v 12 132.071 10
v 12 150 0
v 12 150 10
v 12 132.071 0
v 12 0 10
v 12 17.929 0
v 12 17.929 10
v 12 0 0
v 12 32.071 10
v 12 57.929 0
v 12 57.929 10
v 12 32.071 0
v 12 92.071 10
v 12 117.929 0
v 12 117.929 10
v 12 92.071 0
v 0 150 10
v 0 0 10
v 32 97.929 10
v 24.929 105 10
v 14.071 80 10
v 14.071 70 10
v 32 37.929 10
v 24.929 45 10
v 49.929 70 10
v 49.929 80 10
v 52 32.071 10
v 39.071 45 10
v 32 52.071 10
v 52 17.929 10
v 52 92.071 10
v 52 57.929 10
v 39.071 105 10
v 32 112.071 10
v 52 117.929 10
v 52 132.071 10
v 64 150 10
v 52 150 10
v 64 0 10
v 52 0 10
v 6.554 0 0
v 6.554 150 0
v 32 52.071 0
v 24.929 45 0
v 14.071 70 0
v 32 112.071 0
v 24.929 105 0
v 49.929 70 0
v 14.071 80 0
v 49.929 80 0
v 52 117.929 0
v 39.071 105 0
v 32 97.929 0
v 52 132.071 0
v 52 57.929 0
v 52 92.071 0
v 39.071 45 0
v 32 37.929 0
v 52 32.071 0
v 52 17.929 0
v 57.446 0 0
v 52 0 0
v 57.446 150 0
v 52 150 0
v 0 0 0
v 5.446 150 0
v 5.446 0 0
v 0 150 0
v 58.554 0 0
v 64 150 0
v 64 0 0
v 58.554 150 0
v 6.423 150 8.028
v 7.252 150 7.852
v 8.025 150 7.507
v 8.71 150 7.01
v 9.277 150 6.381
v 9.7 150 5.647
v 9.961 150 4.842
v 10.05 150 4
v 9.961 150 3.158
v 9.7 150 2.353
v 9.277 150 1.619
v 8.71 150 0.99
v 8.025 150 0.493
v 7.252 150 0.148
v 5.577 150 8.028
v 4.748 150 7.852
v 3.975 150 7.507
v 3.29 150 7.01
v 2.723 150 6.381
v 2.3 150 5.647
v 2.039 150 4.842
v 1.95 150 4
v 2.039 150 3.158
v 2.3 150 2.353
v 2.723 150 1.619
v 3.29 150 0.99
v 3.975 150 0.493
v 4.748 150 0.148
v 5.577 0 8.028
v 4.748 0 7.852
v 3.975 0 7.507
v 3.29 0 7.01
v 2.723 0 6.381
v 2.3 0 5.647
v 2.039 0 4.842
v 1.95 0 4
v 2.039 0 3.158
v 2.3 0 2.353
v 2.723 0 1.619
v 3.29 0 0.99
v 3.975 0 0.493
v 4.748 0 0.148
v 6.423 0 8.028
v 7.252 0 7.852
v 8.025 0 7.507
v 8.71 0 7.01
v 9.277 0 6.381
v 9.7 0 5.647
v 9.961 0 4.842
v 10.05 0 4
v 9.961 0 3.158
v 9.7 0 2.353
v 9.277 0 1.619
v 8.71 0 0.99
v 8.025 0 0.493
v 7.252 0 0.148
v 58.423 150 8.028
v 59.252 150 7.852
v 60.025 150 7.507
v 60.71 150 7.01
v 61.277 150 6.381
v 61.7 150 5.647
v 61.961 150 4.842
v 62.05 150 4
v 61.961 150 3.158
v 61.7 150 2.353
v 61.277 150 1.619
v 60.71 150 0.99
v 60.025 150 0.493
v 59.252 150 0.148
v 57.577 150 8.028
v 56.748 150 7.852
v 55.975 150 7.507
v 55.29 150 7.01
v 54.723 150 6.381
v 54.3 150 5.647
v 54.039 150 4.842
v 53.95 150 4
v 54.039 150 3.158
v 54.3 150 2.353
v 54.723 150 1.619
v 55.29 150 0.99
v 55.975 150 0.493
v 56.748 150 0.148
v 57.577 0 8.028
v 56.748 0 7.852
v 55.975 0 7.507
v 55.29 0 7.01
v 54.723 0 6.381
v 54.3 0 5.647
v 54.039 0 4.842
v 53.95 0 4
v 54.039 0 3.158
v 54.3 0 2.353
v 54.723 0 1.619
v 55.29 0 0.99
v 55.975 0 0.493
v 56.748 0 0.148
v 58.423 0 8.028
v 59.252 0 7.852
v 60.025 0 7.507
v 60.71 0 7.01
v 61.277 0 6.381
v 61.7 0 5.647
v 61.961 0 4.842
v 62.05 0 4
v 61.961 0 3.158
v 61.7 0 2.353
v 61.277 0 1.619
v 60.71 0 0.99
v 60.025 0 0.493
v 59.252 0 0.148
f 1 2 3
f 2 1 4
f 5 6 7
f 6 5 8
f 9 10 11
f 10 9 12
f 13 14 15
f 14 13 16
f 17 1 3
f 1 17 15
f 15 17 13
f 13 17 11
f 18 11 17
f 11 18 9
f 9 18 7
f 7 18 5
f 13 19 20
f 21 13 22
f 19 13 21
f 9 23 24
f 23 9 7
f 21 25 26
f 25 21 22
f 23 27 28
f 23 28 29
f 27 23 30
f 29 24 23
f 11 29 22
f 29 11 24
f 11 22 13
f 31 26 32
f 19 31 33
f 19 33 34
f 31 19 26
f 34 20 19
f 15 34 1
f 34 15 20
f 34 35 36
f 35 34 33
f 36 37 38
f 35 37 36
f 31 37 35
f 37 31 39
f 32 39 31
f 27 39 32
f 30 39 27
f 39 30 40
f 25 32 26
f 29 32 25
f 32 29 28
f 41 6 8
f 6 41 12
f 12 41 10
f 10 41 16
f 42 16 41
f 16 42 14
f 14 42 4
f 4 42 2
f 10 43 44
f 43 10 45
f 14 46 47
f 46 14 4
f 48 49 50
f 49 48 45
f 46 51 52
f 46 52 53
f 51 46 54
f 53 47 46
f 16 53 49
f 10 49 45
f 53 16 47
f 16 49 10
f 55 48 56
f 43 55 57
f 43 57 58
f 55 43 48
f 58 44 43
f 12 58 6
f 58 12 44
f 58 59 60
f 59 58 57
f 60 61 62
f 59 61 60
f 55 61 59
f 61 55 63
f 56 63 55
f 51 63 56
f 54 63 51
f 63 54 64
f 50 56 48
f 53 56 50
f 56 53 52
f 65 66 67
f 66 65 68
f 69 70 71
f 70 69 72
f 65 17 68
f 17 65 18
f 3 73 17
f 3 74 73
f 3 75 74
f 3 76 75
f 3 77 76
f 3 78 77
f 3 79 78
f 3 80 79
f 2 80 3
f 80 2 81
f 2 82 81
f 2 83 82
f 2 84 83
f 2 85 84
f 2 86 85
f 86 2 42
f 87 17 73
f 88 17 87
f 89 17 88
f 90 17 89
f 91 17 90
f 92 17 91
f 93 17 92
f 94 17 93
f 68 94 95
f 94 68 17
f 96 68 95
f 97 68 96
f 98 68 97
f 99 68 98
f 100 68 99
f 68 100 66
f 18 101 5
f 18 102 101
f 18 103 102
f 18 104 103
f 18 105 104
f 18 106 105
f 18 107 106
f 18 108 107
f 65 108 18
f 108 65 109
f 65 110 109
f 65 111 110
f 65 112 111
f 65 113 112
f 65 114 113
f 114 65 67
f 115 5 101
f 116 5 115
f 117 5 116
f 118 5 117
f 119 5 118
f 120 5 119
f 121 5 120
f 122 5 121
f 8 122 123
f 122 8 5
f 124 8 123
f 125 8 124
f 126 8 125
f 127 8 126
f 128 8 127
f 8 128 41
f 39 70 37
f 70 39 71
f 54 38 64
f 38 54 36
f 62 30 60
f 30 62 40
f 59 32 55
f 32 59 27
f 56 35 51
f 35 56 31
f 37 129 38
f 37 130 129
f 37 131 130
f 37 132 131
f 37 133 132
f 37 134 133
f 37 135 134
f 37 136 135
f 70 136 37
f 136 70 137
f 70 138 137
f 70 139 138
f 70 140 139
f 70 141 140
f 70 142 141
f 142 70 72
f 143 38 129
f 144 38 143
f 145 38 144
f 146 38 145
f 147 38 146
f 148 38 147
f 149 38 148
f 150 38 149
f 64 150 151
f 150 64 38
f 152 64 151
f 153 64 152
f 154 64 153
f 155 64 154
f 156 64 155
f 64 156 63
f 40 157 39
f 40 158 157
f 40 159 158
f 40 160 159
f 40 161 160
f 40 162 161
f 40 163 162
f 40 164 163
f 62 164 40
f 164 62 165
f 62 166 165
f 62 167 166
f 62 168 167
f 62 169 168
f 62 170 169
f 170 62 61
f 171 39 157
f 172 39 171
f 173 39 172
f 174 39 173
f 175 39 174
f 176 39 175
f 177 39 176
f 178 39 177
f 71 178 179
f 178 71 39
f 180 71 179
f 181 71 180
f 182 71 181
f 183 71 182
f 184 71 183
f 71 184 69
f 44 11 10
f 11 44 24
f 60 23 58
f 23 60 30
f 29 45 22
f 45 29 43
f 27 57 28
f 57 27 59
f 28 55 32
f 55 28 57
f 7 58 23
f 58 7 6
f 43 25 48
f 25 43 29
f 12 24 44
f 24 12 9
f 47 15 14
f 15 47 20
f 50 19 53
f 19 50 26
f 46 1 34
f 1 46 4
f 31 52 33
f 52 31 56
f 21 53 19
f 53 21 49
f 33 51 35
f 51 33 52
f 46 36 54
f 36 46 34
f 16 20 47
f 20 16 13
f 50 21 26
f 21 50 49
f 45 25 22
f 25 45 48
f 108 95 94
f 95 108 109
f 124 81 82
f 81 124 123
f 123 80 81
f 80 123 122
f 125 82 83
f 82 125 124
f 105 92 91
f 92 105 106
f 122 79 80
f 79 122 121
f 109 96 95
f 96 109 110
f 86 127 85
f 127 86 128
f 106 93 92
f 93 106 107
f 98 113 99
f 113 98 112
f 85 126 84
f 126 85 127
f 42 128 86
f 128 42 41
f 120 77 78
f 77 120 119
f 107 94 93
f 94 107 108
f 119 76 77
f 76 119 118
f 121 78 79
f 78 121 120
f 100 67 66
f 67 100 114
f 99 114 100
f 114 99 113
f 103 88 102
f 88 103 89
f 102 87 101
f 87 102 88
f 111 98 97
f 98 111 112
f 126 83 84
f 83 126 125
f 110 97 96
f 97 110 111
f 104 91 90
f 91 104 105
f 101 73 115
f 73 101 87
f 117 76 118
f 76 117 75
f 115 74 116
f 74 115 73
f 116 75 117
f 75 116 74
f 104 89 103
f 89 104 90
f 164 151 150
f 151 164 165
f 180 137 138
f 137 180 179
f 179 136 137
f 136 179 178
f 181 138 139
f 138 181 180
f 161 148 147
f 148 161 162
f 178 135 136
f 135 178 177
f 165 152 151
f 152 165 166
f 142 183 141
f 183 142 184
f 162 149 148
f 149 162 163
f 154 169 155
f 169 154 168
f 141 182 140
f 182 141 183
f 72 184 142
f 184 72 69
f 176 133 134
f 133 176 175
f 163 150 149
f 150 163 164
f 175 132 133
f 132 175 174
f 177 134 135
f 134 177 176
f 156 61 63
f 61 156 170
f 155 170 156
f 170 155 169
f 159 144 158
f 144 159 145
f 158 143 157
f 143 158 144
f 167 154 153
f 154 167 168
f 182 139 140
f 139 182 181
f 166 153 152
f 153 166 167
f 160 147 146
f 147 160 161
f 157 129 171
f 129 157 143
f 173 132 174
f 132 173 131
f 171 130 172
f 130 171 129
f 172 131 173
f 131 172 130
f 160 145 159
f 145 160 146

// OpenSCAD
module shape() {
	cube([12, 150, 10]);
	translate([52, 0, 0]) cube([12, 150, 10]);
	translate([26+6, 45, 5]) rotate([0, 0, 45]) cube([10, 70, 10], center=true);
	translate([26+6, 45, 5]) rotate([0, 0, -45]) cube([10, 70, 10], center=true);
	translate([26+6, 105, 5]) rotate([0, 0, 45]) cube([10, 70, 10], center=true);
	translate([26+6, 105, 5]) rotate([0, 0, -45]) cube([10, 70, 10], center=true);
	translate([26+6, 75, 5]) cube([50, 10, 10], center=true);
}

difference() {
	shape();
	translate([6, -0.1, 4]) rotate([-90, 0, 0]) cylinder(h=150.2, r=4.05, $fn=30);
	translate([52+6, -0.1, 4]) rotate([-90, 0, 0]) cylinder(h=150.2, r=4.05, $fn=30);
}
